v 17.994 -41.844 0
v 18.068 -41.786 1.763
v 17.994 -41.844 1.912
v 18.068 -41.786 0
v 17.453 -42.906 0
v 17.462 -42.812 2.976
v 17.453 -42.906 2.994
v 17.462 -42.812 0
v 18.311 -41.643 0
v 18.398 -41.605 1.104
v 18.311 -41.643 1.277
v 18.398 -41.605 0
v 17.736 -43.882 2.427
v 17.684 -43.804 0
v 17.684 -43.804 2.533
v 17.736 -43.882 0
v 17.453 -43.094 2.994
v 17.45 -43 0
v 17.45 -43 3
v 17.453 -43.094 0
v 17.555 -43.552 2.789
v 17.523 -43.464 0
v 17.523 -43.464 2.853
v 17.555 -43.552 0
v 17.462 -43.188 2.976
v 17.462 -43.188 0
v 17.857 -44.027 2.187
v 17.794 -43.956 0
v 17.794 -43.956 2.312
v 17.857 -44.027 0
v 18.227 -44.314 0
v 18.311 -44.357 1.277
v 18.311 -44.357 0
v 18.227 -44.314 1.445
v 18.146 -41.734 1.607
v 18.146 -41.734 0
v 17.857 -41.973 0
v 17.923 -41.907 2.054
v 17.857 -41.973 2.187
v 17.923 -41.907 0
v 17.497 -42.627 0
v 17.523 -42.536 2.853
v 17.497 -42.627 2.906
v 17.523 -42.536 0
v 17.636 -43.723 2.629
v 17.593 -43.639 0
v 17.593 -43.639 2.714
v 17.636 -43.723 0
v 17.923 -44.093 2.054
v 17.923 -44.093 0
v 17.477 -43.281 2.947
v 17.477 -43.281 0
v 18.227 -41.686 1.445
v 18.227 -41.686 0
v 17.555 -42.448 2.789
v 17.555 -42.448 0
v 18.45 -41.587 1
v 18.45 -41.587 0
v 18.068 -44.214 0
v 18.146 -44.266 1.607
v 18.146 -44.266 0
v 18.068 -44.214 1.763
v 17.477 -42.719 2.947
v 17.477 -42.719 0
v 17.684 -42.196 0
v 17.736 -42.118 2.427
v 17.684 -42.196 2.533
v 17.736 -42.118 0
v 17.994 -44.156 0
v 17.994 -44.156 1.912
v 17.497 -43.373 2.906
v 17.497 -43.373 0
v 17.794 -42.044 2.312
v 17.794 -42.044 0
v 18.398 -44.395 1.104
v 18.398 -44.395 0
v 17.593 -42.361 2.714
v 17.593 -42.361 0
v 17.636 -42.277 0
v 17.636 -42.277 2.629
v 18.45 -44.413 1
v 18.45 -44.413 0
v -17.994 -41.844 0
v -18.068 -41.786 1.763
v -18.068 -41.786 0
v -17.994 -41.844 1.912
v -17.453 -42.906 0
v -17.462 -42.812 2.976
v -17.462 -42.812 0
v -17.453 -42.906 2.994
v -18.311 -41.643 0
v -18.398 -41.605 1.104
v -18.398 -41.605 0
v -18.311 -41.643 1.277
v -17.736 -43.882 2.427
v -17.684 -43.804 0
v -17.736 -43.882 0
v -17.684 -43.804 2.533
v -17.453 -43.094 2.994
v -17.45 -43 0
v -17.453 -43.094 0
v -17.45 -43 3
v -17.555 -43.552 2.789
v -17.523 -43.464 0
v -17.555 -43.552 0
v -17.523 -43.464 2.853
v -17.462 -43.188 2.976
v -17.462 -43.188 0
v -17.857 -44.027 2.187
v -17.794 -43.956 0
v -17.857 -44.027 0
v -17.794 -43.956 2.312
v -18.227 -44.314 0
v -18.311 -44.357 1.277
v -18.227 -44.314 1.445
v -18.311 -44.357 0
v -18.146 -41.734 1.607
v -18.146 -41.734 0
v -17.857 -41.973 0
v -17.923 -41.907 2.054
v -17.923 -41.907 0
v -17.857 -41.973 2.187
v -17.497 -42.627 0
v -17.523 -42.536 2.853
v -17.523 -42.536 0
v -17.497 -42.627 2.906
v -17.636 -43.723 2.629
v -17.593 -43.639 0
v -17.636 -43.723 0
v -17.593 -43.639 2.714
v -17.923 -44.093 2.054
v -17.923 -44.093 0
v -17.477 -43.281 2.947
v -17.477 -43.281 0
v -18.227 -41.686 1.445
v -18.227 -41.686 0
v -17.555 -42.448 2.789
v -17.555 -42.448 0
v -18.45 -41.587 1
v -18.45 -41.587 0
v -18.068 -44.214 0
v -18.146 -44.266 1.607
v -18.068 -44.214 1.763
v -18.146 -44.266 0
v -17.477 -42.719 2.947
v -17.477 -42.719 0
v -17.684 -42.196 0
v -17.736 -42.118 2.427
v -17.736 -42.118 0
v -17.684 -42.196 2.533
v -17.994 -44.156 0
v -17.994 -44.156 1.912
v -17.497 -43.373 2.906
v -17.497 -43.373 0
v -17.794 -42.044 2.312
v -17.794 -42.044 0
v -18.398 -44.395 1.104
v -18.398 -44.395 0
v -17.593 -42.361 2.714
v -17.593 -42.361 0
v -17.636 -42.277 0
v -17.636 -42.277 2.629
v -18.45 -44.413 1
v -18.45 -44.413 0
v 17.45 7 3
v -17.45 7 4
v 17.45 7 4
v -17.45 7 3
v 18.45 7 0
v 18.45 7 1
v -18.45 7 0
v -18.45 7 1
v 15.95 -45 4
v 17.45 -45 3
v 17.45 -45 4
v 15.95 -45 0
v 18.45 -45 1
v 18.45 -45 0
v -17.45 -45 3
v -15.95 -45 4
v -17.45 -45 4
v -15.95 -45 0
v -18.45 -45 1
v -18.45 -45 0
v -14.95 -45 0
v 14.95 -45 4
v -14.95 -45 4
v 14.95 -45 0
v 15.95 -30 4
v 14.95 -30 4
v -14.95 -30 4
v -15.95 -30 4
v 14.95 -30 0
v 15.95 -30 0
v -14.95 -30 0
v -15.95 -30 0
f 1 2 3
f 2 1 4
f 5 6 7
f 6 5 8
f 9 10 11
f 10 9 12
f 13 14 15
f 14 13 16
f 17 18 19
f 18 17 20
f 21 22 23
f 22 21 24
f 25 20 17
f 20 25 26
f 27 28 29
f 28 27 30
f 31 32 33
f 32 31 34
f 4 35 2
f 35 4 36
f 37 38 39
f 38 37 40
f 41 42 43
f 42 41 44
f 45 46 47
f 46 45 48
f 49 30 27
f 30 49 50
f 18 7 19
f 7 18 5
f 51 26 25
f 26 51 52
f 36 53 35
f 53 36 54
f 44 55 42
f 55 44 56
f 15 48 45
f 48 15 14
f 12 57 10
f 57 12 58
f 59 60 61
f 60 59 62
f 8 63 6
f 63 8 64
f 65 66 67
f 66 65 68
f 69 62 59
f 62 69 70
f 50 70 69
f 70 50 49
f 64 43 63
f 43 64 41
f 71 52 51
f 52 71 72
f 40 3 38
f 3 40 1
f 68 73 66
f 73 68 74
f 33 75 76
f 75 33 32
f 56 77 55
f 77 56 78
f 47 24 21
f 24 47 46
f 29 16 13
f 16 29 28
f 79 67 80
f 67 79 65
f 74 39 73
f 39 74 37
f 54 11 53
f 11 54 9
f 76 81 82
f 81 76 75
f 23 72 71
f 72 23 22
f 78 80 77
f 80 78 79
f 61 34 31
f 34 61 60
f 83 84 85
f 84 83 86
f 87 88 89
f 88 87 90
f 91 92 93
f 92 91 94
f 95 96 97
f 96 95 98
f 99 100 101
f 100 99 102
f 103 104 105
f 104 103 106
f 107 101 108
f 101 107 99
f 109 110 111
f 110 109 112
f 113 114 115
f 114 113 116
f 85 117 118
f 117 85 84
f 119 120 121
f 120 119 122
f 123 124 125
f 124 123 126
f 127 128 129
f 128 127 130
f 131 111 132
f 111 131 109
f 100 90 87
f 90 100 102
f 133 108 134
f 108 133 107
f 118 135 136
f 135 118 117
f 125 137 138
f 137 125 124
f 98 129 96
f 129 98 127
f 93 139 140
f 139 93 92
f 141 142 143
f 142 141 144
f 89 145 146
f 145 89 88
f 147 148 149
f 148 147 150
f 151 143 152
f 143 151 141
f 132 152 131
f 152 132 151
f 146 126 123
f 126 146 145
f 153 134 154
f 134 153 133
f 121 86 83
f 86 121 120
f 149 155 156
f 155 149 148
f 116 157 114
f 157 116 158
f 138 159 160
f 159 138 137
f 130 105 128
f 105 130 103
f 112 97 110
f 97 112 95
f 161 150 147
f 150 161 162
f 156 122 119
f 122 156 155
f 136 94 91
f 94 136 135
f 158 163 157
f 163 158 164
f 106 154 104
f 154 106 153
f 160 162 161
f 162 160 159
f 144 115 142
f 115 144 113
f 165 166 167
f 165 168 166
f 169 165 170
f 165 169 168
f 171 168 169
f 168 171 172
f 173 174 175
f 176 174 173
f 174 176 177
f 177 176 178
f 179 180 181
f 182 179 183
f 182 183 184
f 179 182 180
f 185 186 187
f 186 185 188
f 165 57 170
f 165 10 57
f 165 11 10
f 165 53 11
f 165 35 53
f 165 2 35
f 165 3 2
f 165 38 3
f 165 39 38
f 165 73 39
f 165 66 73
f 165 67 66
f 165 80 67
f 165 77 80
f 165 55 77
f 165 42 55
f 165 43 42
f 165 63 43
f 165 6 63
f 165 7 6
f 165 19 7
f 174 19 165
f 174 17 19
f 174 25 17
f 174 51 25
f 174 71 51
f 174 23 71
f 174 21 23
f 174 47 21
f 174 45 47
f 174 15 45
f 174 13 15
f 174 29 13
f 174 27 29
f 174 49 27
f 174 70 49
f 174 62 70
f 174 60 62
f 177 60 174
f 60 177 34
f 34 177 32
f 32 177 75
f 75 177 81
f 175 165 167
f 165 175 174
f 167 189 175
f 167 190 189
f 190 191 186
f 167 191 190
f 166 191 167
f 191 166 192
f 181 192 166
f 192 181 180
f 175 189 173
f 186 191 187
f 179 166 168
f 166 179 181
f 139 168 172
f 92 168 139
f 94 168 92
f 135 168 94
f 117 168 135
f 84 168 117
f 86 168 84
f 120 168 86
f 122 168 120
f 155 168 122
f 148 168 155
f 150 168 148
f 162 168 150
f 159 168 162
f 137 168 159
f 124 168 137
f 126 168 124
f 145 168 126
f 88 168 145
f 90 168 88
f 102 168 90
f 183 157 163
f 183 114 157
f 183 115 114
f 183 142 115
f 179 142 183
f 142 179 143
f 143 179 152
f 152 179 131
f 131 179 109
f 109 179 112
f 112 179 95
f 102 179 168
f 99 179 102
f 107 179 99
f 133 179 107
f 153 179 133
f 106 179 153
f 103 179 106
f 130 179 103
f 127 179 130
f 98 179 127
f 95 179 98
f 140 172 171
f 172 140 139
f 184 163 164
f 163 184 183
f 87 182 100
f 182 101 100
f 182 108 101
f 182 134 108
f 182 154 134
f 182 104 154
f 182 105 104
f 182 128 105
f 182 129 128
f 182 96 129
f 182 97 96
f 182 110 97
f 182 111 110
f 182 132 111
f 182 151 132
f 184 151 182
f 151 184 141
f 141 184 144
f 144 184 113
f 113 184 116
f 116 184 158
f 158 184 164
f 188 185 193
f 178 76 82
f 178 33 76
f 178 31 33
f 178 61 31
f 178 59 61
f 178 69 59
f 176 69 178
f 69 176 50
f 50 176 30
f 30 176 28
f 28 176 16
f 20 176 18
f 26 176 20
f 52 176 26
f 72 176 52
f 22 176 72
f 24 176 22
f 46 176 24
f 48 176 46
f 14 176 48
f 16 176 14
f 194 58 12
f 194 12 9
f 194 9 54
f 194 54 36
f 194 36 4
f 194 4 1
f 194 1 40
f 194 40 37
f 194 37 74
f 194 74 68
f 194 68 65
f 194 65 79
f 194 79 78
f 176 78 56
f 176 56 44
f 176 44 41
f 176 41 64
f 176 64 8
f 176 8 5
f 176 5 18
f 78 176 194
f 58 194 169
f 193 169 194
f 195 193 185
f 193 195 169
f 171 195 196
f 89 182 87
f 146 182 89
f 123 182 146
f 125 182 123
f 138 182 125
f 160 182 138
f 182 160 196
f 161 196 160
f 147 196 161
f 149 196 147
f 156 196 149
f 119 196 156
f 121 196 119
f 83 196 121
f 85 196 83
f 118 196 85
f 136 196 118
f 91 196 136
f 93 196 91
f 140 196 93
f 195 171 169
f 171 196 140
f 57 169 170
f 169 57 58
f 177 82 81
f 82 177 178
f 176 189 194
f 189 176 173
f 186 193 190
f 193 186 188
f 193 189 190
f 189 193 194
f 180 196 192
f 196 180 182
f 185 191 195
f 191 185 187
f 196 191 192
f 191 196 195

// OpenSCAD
//import("C:/SEM_Simonyi/SEM_ProjektoroSCH-main/Doboz/doboz_v5_also.scad");

$fn=100;

//Mennyivel legyen keskenyebb a nyomtatott felső darab az alsóban neki kialakított helynél? Ha nem fér be, feszül, akkor növeld az értéket.
$oldalso_kisebbites=0.05;

color("#b0b0b0",0.8)
render(){


difference(){
	//trapéz-szerű alap:
	union(){
		translate([0,7,0])
			rotate([90,0,0])
				linear_extrude(52)
				polygon([ 
					[-18.5+$oldalso_kisebbites,0],
					[18.5-$oldalso_kisebbites,0],
					[18.5-$oldalso_kisebbites,1],
					[17.5-$oldalso_kisebbites,3],
					[17.5-$oldalso_kisebbites,4],
					[-17.5+$oldalso_kisebbites,4],
					[-17.5+$oldalso_kisebbites, 3],
					[-18.5+$oldalso_kisebbites,1] ]);
	}

	//fél hengerek a rögzítéshez:
	translate([19-$oldalso_kisebbites,-43,1.5])
		difference(){
			cylinder(r=1.5, h=4, center=true);
			translate([0,-5,-5])cube([10,10,10]);
		}
	mirror([1,0,0])
	translate([19-$oldalso_kisebbites,-43,1.5])
		difference(){
			cylinder(r=1.5, h=4, center=true);
			translate([0,-5,-5])cube([10,10,10]);
		}
	//bevágások a hajlékonysághoz a rögzítésnél
	translate([15-$oldalso_kisebbites,-45,0])
		cube([1,15,4]);
	mirror([1,0,0])
	translate([15-$oldalso_kisebbites,-45,0])
		cube([1,15,4]);
}


}//render
